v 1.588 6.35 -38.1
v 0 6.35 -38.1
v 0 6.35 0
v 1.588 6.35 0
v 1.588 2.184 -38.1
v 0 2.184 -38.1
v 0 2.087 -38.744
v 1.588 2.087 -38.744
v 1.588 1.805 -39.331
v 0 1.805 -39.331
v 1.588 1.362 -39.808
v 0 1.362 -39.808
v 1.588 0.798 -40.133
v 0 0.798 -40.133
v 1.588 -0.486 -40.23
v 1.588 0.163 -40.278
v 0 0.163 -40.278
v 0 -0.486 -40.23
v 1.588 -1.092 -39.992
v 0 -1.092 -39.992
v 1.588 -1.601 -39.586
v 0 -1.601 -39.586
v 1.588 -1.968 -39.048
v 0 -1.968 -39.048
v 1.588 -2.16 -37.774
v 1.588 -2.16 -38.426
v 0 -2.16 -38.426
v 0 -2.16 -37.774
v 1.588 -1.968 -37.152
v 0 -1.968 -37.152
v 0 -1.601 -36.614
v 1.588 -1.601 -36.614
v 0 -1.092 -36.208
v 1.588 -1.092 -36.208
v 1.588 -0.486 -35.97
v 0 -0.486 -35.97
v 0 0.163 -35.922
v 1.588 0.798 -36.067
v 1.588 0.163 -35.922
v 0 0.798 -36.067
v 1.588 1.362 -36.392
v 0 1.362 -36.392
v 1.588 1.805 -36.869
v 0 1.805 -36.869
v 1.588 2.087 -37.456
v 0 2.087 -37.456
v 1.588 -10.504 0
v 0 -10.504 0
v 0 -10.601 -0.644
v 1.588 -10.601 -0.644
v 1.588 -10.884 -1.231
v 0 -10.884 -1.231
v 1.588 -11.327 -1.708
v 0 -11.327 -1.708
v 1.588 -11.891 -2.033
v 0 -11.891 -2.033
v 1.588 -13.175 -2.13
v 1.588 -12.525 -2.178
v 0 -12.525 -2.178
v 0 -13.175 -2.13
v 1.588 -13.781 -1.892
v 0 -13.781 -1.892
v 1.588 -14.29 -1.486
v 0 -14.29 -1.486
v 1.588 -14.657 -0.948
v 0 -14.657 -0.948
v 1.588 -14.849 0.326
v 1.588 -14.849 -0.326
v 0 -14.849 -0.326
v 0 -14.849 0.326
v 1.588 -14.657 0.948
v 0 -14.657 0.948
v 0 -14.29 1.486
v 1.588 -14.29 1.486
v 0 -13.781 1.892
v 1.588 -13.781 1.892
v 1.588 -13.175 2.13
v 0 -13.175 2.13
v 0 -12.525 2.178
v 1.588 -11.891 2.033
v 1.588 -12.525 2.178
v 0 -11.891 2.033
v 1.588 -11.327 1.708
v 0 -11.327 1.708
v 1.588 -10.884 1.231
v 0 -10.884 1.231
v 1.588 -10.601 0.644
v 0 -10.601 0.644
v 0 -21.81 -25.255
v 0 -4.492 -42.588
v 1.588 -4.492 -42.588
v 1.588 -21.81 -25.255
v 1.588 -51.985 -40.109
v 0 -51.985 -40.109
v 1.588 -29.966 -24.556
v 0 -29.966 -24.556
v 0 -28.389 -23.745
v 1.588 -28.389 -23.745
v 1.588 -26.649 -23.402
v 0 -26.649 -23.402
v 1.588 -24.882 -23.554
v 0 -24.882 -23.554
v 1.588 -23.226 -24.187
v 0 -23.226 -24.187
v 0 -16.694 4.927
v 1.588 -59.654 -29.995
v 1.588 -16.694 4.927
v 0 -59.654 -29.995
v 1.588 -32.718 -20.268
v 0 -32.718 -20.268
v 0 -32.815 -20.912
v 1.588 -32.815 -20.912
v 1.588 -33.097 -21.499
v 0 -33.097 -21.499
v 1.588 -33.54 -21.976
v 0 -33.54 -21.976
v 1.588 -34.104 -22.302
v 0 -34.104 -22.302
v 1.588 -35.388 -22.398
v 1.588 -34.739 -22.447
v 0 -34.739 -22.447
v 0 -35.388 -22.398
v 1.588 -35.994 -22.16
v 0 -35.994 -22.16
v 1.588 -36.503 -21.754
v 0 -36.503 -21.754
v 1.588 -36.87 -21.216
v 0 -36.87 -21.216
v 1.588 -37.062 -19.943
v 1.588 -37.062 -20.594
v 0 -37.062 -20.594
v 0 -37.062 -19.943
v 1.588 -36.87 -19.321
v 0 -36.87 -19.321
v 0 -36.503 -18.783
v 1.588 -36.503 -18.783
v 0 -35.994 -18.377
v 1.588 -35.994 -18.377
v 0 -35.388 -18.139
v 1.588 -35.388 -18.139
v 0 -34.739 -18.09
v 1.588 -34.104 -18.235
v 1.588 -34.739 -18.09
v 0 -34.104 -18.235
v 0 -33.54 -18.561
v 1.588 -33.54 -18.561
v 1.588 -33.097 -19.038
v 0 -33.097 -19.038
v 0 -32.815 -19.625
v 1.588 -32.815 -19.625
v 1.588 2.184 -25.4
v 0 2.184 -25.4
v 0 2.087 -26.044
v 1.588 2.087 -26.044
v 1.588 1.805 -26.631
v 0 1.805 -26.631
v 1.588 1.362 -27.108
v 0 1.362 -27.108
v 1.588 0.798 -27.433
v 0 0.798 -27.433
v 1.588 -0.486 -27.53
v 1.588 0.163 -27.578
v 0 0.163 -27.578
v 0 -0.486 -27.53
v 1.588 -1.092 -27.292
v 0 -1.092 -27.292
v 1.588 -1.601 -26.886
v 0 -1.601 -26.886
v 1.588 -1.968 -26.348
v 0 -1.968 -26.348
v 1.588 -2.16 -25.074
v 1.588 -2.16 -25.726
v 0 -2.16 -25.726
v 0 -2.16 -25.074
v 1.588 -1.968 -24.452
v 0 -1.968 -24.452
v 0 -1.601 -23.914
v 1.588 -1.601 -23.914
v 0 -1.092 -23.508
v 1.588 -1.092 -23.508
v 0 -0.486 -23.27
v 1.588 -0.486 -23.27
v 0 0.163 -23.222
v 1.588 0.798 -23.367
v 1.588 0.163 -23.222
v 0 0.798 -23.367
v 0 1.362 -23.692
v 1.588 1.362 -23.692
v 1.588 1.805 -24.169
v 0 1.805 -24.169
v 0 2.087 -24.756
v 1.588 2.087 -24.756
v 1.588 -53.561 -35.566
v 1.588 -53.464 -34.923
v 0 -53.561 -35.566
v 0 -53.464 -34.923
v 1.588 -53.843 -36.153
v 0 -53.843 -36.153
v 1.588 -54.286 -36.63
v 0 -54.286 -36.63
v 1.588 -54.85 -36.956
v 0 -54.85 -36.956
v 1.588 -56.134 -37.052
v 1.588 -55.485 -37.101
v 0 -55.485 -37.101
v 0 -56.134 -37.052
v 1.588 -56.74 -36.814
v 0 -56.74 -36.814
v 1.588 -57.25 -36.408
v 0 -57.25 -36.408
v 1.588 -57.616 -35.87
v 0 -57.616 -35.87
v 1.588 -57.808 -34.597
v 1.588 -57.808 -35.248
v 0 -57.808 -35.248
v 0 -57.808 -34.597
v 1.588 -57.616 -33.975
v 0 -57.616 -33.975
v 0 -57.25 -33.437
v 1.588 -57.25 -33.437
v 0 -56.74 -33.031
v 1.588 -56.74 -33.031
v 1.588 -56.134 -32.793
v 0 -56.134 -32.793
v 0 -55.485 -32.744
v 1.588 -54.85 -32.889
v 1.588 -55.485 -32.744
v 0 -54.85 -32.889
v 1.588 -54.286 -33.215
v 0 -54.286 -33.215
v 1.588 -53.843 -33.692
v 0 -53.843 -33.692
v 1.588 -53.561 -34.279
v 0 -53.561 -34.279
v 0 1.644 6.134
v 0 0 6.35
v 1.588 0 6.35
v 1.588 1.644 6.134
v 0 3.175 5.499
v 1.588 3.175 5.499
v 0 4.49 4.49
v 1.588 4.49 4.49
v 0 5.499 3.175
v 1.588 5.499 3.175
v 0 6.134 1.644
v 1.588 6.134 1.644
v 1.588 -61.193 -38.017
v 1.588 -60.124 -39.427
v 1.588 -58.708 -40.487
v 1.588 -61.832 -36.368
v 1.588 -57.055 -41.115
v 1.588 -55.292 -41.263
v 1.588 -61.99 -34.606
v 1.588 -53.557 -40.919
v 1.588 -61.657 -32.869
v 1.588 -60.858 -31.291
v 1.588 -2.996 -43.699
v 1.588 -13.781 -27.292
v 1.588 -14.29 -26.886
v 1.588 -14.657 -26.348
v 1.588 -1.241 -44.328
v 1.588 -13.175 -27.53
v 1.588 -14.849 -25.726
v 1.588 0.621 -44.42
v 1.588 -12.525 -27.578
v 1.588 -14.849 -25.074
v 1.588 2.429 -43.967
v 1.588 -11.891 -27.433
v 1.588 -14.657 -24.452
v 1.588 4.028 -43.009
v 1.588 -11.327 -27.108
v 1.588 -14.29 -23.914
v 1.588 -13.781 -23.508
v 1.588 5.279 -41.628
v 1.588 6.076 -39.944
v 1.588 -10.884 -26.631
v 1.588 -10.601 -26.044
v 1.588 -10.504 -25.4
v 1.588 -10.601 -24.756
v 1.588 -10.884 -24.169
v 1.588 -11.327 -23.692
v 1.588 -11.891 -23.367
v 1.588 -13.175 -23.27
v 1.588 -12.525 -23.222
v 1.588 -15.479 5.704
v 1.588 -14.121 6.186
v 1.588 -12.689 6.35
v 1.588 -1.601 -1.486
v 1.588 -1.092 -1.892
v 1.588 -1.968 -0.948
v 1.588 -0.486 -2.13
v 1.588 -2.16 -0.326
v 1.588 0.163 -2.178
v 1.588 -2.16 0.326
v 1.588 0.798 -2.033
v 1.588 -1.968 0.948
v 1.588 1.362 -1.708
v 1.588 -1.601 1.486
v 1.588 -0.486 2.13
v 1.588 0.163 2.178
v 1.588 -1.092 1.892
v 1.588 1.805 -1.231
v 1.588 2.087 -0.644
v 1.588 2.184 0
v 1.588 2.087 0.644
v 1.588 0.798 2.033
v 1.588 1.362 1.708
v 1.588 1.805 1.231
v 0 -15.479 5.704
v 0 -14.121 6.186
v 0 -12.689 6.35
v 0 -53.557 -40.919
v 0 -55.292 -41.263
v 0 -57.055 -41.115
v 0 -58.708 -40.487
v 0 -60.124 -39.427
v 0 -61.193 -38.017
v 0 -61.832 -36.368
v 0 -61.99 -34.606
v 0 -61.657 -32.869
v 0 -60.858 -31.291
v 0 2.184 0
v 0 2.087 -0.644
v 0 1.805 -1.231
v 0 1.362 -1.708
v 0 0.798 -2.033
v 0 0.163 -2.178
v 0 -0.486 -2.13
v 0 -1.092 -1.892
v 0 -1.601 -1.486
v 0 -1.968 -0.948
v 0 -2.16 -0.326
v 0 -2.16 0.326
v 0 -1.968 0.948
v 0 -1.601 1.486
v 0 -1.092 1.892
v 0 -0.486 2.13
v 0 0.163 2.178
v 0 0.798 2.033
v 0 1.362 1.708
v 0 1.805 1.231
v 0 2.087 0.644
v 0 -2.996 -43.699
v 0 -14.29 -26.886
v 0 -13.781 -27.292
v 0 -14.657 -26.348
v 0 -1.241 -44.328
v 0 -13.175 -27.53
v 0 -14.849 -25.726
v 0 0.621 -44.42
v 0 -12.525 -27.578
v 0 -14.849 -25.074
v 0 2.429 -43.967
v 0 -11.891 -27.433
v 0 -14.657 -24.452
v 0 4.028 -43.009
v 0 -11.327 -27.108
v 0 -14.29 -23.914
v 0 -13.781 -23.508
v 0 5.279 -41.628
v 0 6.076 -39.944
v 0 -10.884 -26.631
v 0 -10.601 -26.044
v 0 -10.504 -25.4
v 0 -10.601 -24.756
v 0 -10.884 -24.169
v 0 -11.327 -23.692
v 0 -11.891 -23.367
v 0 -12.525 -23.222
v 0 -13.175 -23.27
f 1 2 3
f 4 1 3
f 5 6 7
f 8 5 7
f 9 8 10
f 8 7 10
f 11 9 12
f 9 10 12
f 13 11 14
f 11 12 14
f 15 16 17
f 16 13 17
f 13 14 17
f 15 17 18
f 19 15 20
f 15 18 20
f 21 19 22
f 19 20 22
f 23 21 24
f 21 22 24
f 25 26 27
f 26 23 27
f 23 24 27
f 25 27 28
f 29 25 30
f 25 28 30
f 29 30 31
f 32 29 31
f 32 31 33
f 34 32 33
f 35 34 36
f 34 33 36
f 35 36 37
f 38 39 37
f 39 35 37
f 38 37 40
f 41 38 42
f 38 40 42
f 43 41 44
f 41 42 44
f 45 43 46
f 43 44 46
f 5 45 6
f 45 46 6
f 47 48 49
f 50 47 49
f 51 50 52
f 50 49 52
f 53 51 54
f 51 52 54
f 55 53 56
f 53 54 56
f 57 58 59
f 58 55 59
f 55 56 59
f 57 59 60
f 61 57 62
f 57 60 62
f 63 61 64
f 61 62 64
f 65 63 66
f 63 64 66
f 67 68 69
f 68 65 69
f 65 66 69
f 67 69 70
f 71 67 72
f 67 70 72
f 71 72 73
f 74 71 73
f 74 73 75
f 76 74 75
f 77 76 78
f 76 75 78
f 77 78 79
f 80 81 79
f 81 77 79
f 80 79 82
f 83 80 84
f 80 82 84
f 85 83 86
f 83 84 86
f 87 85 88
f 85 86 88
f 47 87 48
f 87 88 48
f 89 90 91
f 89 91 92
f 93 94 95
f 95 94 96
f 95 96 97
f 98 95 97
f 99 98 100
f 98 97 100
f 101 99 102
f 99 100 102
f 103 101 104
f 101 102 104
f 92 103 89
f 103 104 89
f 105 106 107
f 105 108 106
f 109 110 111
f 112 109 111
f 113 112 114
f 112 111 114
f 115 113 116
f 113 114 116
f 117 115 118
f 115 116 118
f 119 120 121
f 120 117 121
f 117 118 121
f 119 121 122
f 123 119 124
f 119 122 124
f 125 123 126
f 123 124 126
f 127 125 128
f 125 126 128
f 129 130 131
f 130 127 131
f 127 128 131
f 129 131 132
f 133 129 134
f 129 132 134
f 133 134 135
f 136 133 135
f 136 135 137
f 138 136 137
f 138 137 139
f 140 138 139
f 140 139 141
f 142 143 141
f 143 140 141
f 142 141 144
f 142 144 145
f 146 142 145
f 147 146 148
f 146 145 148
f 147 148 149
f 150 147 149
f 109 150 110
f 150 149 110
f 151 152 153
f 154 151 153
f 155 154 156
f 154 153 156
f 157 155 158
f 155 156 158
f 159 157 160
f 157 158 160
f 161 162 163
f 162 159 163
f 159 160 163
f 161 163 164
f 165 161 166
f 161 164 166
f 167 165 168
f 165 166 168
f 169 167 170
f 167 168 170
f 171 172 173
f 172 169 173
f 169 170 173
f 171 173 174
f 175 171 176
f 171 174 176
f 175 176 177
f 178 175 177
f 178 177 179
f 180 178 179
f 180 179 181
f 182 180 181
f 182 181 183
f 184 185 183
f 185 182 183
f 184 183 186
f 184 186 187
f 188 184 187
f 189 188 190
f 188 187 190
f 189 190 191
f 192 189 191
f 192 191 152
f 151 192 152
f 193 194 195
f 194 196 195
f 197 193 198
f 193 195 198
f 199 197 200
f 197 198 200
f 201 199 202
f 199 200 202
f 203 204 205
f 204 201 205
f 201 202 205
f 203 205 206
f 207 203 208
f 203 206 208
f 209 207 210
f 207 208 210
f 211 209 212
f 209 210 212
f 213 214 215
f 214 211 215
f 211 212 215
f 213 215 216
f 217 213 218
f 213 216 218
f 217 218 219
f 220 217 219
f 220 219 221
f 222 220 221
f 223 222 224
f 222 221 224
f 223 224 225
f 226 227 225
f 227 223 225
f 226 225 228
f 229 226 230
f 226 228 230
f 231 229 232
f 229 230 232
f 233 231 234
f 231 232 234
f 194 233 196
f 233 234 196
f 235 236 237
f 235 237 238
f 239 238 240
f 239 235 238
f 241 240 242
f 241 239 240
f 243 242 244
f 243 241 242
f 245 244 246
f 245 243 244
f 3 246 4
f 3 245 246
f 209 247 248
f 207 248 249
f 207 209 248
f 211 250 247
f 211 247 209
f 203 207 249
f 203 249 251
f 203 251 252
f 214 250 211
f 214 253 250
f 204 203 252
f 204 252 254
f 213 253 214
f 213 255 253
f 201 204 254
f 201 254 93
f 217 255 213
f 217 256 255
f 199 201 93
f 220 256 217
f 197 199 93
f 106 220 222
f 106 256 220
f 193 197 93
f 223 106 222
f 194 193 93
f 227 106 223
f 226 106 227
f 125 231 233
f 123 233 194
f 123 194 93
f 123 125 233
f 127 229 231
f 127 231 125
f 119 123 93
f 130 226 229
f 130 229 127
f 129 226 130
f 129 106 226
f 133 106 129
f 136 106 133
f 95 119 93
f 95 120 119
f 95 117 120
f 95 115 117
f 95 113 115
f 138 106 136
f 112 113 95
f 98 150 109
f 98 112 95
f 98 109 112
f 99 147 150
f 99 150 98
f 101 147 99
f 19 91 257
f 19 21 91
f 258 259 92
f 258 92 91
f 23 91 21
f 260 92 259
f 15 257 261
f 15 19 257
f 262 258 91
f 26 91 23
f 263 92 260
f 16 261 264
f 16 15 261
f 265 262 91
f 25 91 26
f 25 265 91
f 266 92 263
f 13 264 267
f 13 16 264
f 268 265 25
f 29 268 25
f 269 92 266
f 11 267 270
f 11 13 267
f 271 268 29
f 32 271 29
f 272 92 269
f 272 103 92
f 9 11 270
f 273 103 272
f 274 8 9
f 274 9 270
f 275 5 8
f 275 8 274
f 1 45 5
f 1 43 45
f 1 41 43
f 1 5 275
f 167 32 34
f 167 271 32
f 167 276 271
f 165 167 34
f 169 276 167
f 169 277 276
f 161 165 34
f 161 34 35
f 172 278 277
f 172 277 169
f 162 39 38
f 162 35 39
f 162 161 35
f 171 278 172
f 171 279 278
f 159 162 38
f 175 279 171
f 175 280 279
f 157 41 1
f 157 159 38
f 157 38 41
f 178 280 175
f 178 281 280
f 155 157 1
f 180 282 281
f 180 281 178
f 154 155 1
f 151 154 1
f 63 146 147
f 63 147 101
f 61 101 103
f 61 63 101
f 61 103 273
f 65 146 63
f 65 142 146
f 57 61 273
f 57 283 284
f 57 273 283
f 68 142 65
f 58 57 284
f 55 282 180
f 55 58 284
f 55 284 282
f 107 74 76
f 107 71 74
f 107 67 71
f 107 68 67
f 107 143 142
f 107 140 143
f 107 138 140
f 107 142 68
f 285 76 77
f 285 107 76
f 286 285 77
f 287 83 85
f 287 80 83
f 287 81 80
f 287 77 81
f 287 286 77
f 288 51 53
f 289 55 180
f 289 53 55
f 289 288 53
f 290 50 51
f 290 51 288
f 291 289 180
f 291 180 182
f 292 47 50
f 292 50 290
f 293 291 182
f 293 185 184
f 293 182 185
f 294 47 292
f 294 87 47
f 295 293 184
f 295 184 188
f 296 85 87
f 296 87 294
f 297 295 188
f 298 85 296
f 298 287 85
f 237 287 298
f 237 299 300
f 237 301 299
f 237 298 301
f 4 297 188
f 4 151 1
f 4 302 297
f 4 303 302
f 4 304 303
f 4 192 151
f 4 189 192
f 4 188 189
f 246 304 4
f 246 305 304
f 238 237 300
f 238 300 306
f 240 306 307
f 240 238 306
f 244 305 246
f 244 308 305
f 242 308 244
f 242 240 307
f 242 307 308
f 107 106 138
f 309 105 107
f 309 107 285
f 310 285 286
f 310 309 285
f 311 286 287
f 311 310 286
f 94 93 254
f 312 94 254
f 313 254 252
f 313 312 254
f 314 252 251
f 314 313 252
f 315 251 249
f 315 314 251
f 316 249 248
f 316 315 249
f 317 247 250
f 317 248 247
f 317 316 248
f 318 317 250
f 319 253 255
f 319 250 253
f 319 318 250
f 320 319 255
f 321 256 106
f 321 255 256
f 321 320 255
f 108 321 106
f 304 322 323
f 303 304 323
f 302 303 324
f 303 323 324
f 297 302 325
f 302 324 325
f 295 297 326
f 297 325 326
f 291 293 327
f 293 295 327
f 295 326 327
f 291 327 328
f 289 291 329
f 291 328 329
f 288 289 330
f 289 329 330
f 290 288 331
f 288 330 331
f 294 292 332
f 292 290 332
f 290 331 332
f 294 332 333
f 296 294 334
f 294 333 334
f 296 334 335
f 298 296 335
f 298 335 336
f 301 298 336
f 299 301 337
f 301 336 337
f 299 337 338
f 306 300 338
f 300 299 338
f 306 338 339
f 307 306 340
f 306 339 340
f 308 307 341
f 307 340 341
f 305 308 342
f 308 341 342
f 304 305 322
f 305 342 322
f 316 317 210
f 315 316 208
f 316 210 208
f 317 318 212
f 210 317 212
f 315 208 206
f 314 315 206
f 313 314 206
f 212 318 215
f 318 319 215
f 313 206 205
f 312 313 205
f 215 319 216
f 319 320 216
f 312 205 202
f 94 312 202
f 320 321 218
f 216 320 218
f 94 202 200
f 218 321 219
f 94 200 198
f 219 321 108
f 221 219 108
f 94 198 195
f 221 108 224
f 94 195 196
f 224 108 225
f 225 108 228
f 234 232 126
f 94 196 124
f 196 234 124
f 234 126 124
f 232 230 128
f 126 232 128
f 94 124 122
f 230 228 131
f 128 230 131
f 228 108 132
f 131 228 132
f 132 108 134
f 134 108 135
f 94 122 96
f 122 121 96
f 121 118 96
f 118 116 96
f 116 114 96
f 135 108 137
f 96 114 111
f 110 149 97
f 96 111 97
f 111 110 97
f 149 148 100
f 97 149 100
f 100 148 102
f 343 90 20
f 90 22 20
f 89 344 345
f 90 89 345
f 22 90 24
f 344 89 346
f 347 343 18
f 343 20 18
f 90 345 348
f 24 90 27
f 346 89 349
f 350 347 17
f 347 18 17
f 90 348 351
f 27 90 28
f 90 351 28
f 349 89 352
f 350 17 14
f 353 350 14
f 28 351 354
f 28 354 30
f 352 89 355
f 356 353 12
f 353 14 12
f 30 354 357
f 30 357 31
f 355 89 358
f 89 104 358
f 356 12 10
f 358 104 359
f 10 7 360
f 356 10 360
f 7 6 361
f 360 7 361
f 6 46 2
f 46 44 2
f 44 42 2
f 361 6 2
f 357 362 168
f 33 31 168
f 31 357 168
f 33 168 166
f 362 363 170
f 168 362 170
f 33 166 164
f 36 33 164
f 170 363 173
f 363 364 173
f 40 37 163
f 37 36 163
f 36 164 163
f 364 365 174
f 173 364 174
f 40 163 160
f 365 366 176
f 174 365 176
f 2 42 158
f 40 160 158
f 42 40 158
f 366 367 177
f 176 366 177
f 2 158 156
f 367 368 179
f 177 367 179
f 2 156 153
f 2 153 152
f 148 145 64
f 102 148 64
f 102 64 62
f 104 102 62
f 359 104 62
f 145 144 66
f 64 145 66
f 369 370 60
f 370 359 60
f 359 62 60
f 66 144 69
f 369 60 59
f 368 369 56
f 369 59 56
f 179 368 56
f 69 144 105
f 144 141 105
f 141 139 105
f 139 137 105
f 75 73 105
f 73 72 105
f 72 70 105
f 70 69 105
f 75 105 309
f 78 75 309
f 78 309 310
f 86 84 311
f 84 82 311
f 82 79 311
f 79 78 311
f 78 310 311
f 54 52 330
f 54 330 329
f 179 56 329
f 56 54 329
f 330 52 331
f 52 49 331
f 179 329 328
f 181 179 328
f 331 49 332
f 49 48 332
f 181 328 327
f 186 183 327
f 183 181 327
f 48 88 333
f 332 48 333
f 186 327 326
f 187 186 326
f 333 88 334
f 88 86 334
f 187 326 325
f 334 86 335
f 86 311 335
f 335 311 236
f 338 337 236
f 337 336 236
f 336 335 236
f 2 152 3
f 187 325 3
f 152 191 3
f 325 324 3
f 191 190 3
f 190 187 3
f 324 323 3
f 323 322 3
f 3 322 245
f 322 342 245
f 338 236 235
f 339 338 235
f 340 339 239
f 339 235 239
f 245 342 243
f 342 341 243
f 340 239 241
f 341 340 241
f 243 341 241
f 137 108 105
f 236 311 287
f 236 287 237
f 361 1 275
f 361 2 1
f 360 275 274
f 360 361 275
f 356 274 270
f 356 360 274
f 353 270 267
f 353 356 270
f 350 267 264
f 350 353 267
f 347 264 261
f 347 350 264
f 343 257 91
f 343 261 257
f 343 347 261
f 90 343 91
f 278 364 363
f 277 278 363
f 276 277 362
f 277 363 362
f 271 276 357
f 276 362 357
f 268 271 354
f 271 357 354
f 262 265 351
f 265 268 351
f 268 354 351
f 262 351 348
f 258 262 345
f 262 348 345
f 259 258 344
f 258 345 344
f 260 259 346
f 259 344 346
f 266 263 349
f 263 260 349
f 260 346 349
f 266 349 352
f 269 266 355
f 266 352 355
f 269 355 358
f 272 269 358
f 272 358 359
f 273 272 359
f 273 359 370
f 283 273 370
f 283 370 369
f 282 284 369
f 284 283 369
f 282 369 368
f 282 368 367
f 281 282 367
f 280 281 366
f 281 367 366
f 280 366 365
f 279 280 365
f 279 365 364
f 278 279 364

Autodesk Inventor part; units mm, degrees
ref_plane "YZ Plane" through (0, 0, 0) normal (1, 0, 0) x (0, 1, 0)
ref_plane "XZ Plane" through (0, 0, 0) normal (0, 1, 0) x (-1, 0, 0)
ref_plane "XY Plane" through (0, 0, 0) normal (0, 0, 1) x (1, 0, 0)
sketch "maiin" plane through (0, 0, 0) normal (0, 0, 1) x (1, 0, 0)
  arc A0 (6.5899, -1.511) -> (-1.5658, -0.8125) centre (2.0978, -5.9991) ccw
  circle A1 centre (-6.5018, 3.4753) radius 2.1844
  line L0 (-31.2537, -6.2516) -> (11.7059, 28.671)
  line L1 (-23.5847, -16.3655) -> (-1.5658, -0.8125)
  circle A2 centre (-27.2482, -11.1789) radius 2.1844
  arc A3 (-31.2537, -6.2516) -> (-23.5847, -16.3655) centre (-27.2482, -11.1789) ccw
  circle A4 centre (28.4, -14.3563) radius 2.1844
  line L2 (34.75, -14.3563) -> (34.75, 23.7437)
  line L3 (15.7114, 30.0937) -> (28.4, 30.0937)
  circle A5 centre (28.4, 23.7437) radius 2.1844
  circle A6 centre (28.4, -1.6563) radius 2.1844
  arc A7 (23.9079, -18.8444) -> (34.75, -14.3563) centre (28.4, -14.3563) ccw
  line L4 (23.9079, -18.8444) -> (6.5899, -1.511)
  circle A8 centre (15.7114, 23.7437) radius 2.1844
  circle A9 centre (15.7114, -1.6563) radius 2.1844
  arc A10 (34.75, 23.7437) -> (28.4, 30.0937) centre (28.4, 23.7437) ccw
  arc A11 (15.7114, 30.0937) -> (11.7059, 28.671) centre (15.7114, 23.7437) ccw
  point P0 (10.0881, 4.3711)
  dimension "d0" = 12.7
  dimension "d1" = 12.7
  dimension "d4" = 6.35
  dimension "d6" = 4.3688
sketch "Sketch1" plane through (0, 0, 0) normal (1, 0, 0) x (0, 1, 0)
  arc A0 (-21.8101, -25.2546) -> (-29.9658, -24.5561) centre (-26.3022, -29.7428) ccw
  circle A1 centre (-34.9019, -20.2684) radius 2.1844
  line L0 (-59.6538, -29.9953) -> (-16.6941, 4.9273)
  line L1 (-51.9847, -40.1092) -> (-29.9658, -24.5561)
  circle A2 centre (-55.6483, -34.9226) radius 2.1844
  arc A3 (-59.6538, -29.9953) -> (-51.9847, -40.1092) centre (-55.6483, -34.9226) ccw
  circle A4 centre (0, -38.1) radius 2.1844
  line L2 (6.35, -38.1) -> (6.35, 0)
  line L3 (-12.6886, 6.35) -> (0, 6.35)
  circle A5 centre (0, 0) radius 2.1844
  circle A6 centre (0, -25.4) radius 2.1844
  arc A7 (-4.4921, -42.5881) -> (6.35, -38.1) centre (0, -38.1) ccw
  line L4 (-4.4921, -42.5881) -> (-21.8101, -25.2546)
  circle A8 centre (-12.6886, 0) radius 2.1844
  circle A9 centre (-12.6886, -25.4) radius 2.1844
  arc A10 (6.35, 0) -> (0, 6.35) centre (0, 0) ccw
  arc A11 (-12.6886, 6.35) -> (-16.6941, 4.9273) centre (-12.6886, 0) ccw
extrude "Extrusion1" add sketch "Sketch1" along normal blind 1.5875
properties part number "triangle_brace_gusset"
